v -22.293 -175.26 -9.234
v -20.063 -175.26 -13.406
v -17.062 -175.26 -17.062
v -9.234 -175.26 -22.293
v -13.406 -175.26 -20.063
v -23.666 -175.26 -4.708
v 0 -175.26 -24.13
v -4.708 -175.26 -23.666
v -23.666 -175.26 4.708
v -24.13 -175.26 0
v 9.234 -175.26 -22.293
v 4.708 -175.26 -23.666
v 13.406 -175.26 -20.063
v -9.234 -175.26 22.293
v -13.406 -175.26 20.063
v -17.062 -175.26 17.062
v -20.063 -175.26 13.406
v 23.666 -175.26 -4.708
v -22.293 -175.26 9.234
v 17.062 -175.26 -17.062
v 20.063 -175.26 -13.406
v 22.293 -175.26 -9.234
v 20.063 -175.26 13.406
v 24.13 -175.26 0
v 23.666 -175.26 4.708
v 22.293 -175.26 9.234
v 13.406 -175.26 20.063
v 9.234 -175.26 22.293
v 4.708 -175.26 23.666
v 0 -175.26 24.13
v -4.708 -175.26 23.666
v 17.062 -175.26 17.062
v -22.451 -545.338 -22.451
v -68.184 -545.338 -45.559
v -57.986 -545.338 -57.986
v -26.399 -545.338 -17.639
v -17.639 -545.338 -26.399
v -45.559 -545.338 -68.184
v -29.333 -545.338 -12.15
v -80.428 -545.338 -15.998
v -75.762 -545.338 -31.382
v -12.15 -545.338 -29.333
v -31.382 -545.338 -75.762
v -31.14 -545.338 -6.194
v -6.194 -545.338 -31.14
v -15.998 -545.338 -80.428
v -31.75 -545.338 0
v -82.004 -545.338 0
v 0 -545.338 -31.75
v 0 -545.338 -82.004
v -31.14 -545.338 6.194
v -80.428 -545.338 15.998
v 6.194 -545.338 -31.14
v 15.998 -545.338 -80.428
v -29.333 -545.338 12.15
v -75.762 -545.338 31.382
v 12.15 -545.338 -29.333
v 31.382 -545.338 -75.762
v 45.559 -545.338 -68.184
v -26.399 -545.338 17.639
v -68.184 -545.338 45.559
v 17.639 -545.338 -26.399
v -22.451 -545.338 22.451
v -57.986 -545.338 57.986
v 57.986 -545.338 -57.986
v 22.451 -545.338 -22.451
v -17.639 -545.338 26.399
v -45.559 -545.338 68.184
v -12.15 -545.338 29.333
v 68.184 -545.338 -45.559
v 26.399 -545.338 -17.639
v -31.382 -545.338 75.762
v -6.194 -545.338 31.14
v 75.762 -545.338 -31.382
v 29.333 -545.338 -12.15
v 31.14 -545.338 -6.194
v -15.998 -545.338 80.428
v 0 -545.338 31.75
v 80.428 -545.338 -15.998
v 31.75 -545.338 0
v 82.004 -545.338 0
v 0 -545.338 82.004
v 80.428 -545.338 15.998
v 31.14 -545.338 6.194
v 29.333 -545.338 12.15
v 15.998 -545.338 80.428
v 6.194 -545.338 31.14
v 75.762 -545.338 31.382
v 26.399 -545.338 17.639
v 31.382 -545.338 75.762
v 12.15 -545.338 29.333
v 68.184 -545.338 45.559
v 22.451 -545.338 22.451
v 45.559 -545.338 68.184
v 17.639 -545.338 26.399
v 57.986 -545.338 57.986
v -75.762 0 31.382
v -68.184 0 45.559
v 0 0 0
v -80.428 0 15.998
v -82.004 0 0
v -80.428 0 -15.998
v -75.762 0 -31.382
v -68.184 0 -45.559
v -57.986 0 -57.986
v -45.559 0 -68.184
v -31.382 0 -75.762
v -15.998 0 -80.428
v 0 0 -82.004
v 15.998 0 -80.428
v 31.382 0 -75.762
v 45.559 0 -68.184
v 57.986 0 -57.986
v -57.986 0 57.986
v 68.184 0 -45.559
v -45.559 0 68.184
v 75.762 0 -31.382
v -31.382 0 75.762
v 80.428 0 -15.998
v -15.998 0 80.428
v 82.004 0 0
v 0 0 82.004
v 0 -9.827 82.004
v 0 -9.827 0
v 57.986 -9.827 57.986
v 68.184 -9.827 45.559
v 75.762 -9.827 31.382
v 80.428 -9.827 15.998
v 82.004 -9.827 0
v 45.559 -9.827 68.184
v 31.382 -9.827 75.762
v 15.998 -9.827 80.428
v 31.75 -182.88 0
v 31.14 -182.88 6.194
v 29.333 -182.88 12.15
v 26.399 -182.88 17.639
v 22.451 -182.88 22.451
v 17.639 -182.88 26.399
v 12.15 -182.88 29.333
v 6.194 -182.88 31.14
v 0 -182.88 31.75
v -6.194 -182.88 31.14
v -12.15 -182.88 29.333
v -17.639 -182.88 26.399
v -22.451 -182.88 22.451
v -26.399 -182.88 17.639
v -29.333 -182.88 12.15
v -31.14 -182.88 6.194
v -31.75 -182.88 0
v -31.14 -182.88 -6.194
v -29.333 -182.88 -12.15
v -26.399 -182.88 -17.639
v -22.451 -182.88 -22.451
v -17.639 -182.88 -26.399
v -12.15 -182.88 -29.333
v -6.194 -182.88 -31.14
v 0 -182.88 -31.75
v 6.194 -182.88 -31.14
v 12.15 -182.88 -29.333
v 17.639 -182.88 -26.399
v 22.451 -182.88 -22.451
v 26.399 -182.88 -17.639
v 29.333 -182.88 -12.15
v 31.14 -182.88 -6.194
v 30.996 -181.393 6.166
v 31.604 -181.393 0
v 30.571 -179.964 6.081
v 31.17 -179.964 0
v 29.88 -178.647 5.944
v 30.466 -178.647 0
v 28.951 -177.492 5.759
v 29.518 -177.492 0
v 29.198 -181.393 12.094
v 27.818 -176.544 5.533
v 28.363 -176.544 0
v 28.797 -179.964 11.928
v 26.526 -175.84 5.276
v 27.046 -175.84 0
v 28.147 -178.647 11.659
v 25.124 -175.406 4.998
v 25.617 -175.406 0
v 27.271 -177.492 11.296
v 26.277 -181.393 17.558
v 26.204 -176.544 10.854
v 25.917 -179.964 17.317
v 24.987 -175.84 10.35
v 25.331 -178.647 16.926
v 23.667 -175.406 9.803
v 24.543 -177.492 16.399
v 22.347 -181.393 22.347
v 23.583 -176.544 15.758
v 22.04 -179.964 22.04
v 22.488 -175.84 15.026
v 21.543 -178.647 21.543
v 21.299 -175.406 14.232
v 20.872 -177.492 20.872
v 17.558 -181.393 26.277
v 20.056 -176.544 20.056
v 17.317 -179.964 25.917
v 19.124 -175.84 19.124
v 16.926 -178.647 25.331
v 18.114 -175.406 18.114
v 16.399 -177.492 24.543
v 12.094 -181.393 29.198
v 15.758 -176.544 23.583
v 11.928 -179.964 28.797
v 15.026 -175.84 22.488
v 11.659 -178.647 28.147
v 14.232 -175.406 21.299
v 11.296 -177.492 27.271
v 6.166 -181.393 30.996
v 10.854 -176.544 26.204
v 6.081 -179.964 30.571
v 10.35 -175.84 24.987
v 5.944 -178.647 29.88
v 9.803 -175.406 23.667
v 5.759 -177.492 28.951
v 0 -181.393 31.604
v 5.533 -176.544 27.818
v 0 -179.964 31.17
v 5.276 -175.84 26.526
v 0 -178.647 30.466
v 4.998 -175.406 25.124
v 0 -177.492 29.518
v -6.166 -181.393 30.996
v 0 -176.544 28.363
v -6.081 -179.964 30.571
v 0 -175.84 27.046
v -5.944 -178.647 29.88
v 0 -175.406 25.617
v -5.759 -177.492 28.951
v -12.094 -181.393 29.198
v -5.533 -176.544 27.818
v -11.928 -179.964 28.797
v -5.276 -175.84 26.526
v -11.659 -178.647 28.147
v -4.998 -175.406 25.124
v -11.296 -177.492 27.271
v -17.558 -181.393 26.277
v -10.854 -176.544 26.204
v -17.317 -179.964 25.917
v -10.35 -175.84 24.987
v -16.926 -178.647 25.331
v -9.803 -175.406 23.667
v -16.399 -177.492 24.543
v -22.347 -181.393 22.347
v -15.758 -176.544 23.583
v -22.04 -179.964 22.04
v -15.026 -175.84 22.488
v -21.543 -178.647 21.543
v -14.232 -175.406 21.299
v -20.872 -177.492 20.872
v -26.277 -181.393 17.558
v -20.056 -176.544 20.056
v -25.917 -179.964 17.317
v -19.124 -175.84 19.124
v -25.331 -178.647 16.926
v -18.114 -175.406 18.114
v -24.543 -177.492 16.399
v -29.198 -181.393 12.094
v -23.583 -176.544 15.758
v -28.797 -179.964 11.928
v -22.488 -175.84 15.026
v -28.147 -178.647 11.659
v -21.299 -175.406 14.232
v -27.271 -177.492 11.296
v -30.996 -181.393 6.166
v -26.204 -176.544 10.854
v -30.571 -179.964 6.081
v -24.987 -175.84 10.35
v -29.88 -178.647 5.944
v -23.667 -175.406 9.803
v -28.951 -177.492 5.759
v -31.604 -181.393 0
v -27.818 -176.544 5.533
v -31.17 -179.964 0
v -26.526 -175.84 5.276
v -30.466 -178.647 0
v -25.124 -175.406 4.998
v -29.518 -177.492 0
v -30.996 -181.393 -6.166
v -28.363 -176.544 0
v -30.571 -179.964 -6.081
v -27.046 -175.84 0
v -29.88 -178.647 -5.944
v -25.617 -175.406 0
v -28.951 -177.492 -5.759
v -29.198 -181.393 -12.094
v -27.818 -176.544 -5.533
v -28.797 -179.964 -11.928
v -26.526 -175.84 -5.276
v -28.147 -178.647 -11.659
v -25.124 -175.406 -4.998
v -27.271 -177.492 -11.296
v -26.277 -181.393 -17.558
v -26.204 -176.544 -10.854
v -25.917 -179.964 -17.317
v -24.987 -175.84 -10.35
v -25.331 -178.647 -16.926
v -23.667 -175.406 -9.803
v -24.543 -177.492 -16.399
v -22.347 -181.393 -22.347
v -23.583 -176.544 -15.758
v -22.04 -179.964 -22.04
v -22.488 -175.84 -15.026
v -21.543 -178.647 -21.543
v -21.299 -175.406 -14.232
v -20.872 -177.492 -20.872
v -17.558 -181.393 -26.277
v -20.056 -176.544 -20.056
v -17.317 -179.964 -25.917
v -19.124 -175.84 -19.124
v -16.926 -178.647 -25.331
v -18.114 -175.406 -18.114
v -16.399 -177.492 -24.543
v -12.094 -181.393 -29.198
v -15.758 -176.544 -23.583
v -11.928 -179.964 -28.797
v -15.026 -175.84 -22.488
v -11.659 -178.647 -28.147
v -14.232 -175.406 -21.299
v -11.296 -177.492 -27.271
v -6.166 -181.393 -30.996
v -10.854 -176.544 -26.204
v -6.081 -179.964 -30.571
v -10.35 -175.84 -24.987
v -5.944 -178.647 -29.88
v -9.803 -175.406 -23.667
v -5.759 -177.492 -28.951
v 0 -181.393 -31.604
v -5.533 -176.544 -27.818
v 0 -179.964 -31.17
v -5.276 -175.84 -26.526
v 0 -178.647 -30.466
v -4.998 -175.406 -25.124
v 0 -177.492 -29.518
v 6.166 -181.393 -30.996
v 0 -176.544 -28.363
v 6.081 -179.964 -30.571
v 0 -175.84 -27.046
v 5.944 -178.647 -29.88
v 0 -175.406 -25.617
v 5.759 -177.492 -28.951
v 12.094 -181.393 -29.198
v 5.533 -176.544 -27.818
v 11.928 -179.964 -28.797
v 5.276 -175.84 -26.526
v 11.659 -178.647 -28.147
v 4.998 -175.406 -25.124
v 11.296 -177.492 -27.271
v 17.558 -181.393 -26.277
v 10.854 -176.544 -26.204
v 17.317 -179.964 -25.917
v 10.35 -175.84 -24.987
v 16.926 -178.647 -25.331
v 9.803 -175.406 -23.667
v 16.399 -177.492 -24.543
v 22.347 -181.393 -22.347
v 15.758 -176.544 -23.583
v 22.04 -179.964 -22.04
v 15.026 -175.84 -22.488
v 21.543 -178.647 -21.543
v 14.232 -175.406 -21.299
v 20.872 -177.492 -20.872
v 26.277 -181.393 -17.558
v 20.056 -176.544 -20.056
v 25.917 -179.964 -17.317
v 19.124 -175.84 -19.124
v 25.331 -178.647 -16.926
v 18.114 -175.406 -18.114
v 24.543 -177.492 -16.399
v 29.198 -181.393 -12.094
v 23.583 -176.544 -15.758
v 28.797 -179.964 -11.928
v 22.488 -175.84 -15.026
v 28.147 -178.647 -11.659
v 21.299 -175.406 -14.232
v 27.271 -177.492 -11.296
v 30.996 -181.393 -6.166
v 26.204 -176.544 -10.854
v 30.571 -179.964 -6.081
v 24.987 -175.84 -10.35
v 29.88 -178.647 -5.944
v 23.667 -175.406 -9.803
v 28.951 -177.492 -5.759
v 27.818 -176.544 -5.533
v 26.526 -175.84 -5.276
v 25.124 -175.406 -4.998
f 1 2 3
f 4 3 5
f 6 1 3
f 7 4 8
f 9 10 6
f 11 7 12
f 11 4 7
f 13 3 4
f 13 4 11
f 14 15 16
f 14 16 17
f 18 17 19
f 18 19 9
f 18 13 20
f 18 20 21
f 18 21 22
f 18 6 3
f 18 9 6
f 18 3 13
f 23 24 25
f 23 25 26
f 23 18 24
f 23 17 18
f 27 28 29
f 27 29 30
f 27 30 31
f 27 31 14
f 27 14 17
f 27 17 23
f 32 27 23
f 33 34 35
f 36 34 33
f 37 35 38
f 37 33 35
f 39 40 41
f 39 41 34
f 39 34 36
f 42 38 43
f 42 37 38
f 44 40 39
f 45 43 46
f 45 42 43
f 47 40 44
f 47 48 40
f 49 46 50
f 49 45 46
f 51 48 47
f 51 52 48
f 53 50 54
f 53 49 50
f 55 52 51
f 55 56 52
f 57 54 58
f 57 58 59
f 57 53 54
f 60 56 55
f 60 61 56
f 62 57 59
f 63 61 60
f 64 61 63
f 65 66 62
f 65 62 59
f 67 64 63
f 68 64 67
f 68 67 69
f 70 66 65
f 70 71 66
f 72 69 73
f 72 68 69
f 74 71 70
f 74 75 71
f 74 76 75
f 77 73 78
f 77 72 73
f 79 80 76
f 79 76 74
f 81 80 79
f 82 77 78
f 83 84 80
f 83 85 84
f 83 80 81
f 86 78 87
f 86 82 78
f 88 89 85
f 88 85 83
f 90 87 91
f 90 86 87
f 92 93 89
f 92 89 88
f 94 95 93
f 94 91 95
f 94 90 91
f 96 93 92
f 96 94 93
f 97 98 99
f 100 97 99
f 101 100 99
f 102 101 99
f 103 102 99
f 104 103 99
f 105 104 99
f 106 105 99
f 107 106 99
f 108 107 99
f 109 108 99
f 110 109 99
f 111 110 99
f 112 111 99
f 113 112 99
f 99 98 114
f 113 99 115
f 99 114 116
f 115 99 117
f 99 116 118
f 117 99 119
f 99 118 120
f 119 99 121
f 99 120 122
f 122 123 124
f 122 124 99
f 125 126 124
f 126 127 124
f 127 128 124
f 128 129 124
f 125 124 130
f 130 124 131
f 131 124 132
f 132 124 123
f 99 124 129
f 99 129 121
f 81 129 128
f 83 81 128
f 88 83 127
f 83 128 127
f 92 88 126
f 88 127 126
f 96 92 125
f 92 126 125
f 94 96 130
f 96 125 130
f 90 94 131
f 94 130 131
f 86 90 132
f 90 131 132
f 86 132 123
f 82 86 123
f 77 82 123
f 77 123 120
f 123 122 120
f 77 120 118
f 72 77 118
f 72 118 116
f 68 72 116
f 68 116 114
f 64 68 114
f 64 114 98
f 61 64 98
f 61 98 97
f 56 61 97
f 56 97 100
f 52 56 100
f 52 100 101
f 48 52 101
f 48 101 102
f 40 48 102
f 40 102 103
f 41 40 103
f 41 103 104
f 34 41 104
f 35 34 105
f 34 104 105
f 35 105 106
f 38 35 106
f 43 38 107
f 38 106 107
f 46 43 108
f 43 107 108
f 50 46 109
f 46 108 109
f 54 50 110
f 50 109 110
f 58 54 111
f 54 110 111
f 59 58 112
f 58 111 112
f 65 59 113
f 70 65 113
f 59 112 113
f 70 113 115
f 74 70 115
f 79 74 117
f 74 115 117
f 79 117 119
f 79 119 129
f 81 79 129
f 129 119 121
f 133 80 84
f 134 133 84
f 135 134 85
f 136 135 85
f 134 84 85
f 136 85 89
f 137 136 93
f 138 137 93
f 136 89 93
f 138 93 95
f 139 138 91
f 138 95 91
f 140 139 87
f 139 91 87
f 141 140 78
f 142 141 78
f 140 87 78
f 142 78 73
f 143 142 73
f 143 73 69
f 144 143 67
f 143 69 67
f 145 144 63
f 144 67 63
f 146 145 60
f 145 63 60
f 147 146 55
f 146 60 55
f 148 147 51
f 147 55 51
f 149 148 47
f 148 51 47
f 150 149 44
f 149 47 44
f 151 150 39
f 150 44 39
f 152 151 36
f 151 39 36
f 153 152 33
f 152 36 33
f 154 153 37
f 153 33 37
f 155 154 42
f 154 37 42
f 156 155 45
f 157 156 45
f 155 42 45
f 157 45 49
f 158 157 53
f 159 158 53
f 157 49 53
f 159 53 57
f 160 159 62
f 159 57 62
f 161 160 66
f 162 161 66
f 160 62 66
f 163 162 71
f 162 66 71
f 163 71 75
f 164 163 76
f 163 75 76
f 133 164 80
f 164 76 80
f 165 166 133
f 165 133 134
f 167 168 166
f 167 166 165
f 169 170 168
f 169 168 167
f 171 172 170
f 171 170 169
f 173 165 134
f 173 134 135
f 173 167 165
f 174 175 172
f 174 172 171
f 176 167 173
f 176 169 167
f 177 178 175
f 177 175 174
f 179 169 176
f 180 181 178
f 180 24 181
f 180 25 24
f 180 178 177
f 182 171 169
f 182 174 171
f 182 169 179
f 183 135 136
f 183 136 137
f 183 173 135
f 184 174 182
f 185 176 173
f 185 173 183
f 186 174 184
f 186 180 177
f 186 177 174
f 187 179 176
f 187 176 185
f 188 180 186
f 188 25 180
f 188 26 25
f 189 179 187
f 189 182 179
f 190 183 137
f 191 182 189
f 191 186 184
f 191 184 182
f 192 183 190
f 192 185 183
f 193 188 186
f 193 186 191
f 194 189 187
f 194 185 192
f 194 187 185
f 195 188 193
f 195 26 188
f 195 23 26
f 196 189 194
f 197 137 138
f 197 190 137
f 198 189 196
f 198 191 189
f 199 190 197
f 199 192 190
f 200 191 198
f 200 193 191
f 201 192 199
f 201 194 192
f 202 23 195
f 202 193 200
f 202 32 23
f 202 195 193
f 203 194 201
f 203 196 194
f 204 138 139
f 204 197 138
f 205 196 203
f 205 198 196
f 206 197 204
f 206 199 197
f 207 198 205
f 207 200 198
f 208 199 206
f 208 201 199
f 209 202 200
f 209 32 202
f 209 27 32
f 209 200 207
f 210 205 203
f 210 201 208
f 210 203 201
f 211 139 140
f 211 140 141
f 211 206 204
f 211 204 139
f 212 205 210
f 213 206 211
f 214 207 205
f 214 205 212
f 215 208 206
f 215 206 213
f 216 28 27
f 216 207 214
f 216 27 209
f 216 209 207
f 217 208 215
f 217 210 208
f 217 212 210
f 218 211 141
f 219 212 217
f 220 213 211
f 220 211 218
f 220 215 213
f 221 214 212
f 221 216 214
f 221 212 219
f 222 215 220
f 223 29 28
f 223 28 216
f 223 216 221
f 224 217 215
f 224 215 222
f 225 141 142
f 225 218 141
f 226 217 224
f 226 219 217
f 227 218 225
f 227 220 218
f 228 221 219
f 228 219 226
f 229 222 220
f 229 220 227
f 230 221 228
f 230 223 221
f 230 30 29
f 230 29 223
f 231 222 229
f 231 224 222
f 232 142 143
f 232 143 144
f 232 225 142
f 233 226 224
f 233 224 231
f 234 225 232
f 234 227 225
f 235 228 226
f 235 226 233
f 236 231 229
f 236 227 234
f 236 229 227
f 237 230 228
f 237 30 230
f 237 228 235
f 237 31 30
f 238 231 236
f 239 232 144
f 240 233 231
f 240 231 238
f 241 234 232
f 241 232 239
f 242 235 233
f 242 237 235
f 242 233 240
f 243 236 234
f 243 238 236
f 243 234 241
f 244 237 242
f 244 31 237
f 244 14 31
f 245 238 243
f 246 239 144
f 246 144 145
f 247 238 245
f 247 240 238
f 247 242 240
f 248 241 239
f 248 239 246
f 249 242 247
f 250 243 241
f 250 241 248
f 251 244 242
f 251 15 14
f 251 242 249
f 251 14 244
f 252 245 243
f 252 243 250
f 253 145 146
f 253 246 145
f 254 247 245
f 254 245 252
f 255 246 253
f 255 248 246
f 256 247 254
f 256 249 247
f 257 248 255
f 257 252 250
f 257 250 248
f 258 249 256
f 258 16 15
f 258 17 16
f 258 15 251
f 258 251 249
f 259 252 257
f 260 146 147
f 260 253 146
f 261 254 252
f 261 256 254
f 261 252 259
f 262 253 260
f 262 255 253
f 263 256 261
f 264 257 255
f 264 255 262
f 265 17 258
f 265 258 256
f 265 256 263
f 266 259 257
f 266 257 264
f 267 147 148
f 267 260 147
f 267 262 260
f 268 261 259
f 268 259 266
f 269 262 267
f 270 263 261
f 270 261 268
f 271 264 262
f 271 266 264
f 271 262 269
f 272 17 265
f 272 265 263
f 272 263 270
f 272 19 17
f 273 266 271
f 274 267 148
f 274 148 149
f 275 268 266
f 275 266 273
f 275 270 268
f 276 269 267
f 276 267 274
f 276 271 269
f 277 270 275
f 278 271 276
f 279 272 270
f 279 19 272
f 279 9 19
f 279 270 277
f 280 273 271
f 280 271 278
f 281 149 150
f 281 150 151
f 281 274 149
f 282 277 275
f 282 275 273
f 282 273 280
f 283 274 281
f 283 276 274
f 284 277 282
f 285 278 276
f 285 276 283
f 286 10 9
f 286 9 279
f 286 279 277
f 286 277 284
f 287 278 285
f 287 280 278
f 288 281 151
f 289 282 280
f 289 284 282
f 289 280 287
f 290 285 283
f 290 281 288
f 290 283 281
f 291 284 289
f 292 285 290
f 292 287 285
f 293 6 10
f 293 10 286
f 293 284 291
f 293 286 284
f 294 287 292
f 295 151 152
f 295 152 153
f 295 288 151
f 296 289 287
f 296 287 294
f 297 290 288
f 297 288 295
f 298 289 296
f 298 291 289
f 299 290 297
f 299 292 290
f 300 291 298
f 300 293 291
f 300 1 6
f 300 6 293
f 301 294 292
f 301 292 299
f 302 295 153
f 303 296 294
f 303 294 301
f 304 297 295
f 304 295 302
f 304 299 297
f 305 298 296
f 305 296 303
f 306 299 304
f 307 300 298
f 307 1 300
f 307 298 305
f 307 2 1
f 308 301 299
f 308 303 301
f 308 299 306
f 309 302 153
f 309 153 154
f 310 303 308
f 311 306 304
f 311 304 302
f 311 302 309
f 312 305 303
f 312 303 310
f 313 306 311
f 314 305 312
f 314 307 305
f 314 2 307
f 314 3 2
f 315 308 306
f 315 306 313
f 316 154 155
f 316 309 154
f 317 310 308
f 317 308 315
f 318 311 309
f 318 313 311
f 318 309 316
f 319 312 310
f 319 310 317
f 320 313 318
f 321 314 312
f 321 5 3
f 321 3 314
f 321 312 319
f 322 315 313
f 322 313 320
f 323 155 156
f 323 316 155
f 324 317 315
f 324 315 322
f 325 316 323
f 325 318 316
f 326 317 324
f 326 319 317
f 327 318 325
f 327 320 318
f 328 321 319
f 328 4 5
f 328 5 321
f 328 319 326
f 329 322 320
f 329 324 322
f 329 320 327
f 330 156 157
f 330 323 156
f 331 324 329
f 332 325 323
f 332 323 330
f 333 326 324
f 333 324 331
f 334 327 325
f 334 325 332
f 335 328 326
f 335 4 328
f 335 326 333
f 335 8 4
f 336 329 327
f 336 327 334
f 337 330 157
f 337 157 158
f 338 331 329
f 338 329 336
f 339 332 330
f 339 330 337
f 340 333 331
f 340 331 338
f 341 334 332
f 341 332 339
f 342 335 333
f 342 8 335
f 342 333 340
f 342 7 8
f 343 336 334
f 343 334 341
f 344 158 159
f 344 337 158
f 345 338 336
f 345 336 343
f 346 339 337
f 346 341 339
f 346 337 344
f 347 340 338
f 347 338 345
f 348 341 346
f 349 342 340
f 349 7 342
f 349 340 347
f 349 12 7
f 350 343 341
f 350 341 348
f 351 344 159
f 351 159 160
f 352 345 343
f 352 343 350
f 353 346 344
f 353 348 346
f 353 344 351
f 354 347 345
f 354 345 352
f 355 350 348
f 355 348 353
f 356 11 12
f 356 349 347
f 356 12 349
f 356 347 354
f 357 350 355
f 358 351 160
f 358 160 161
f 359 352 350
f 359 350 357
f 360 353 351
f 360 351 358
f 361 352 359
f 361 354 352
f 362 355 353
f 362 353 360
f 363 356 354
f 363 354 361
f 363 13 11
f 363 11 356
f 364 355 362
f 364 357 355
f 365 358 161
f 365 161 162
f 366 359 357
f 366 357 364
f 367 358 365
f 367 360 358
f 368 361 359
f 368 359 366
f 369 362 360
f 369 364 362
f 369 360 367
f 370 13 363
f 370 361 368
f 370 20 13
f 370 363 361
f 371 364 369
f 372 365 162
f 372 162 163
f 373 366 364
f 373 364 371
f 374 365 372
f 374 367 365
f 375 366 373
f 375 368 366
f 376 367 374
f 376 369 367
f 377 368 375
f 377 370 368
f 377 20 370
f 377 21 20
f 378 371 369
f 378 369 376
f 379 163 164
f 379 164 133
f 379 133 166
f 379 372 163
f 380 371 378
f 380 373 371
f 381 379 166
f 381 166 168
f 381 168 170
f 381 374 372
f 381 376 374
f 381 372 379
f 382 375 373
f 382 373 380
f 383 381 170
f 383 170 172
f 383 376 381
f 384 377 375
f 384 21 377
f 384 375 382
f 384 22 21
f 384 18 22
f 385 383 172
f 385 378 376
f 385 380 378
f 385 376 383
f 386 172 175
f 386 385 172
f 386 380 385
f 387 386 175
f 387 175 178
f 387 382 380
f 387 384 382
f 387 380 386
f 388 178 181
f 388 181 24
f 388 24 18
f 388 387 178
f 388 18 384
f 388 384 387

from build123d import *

# Parameters (mm, degrees)
F0_R     = 82.0039
F1_DEPTH = 545.338
F2_R     = 31.75
F3_DEPTH = 370.078
F4_R     = 7.62
F5_W     = 9.82706
F5_H     = 91.064006
F6_DEPTH = 117


with BuildPart() as f1:
    # F0 (on Front) → F1 (new body)
    with BuildSketch(Plane.XZ):
        Circle(F0_R)
    extrude(amount=F1_DEPTH)

    # F2 (on face) → F3 (cut)
    with BuildSketch(Plane.XZ.offset(545.338)):
        Circle(F2_R)
    extrude(amount=-F3_DEPTH, mode=Mode.SUBTRACT)

    # F4
    f4_edges = [f1.edges().sort_by_distance(p)[0] for p in [
        (-31.75, -175.26, 0),
    ]]
    fillet(f4_edges, radius=F4_R)

    # F5 (on Right) → F6 (cut)
    with BuildSketch(Plane.YZ):
        with Locations((-4.91353, 45.532003)):
            Rectangle(F5_W, F5_H)
    extrude(amount=F6_DEPTH, mode=Mode.SUBTRACT)


solid = f1.part
